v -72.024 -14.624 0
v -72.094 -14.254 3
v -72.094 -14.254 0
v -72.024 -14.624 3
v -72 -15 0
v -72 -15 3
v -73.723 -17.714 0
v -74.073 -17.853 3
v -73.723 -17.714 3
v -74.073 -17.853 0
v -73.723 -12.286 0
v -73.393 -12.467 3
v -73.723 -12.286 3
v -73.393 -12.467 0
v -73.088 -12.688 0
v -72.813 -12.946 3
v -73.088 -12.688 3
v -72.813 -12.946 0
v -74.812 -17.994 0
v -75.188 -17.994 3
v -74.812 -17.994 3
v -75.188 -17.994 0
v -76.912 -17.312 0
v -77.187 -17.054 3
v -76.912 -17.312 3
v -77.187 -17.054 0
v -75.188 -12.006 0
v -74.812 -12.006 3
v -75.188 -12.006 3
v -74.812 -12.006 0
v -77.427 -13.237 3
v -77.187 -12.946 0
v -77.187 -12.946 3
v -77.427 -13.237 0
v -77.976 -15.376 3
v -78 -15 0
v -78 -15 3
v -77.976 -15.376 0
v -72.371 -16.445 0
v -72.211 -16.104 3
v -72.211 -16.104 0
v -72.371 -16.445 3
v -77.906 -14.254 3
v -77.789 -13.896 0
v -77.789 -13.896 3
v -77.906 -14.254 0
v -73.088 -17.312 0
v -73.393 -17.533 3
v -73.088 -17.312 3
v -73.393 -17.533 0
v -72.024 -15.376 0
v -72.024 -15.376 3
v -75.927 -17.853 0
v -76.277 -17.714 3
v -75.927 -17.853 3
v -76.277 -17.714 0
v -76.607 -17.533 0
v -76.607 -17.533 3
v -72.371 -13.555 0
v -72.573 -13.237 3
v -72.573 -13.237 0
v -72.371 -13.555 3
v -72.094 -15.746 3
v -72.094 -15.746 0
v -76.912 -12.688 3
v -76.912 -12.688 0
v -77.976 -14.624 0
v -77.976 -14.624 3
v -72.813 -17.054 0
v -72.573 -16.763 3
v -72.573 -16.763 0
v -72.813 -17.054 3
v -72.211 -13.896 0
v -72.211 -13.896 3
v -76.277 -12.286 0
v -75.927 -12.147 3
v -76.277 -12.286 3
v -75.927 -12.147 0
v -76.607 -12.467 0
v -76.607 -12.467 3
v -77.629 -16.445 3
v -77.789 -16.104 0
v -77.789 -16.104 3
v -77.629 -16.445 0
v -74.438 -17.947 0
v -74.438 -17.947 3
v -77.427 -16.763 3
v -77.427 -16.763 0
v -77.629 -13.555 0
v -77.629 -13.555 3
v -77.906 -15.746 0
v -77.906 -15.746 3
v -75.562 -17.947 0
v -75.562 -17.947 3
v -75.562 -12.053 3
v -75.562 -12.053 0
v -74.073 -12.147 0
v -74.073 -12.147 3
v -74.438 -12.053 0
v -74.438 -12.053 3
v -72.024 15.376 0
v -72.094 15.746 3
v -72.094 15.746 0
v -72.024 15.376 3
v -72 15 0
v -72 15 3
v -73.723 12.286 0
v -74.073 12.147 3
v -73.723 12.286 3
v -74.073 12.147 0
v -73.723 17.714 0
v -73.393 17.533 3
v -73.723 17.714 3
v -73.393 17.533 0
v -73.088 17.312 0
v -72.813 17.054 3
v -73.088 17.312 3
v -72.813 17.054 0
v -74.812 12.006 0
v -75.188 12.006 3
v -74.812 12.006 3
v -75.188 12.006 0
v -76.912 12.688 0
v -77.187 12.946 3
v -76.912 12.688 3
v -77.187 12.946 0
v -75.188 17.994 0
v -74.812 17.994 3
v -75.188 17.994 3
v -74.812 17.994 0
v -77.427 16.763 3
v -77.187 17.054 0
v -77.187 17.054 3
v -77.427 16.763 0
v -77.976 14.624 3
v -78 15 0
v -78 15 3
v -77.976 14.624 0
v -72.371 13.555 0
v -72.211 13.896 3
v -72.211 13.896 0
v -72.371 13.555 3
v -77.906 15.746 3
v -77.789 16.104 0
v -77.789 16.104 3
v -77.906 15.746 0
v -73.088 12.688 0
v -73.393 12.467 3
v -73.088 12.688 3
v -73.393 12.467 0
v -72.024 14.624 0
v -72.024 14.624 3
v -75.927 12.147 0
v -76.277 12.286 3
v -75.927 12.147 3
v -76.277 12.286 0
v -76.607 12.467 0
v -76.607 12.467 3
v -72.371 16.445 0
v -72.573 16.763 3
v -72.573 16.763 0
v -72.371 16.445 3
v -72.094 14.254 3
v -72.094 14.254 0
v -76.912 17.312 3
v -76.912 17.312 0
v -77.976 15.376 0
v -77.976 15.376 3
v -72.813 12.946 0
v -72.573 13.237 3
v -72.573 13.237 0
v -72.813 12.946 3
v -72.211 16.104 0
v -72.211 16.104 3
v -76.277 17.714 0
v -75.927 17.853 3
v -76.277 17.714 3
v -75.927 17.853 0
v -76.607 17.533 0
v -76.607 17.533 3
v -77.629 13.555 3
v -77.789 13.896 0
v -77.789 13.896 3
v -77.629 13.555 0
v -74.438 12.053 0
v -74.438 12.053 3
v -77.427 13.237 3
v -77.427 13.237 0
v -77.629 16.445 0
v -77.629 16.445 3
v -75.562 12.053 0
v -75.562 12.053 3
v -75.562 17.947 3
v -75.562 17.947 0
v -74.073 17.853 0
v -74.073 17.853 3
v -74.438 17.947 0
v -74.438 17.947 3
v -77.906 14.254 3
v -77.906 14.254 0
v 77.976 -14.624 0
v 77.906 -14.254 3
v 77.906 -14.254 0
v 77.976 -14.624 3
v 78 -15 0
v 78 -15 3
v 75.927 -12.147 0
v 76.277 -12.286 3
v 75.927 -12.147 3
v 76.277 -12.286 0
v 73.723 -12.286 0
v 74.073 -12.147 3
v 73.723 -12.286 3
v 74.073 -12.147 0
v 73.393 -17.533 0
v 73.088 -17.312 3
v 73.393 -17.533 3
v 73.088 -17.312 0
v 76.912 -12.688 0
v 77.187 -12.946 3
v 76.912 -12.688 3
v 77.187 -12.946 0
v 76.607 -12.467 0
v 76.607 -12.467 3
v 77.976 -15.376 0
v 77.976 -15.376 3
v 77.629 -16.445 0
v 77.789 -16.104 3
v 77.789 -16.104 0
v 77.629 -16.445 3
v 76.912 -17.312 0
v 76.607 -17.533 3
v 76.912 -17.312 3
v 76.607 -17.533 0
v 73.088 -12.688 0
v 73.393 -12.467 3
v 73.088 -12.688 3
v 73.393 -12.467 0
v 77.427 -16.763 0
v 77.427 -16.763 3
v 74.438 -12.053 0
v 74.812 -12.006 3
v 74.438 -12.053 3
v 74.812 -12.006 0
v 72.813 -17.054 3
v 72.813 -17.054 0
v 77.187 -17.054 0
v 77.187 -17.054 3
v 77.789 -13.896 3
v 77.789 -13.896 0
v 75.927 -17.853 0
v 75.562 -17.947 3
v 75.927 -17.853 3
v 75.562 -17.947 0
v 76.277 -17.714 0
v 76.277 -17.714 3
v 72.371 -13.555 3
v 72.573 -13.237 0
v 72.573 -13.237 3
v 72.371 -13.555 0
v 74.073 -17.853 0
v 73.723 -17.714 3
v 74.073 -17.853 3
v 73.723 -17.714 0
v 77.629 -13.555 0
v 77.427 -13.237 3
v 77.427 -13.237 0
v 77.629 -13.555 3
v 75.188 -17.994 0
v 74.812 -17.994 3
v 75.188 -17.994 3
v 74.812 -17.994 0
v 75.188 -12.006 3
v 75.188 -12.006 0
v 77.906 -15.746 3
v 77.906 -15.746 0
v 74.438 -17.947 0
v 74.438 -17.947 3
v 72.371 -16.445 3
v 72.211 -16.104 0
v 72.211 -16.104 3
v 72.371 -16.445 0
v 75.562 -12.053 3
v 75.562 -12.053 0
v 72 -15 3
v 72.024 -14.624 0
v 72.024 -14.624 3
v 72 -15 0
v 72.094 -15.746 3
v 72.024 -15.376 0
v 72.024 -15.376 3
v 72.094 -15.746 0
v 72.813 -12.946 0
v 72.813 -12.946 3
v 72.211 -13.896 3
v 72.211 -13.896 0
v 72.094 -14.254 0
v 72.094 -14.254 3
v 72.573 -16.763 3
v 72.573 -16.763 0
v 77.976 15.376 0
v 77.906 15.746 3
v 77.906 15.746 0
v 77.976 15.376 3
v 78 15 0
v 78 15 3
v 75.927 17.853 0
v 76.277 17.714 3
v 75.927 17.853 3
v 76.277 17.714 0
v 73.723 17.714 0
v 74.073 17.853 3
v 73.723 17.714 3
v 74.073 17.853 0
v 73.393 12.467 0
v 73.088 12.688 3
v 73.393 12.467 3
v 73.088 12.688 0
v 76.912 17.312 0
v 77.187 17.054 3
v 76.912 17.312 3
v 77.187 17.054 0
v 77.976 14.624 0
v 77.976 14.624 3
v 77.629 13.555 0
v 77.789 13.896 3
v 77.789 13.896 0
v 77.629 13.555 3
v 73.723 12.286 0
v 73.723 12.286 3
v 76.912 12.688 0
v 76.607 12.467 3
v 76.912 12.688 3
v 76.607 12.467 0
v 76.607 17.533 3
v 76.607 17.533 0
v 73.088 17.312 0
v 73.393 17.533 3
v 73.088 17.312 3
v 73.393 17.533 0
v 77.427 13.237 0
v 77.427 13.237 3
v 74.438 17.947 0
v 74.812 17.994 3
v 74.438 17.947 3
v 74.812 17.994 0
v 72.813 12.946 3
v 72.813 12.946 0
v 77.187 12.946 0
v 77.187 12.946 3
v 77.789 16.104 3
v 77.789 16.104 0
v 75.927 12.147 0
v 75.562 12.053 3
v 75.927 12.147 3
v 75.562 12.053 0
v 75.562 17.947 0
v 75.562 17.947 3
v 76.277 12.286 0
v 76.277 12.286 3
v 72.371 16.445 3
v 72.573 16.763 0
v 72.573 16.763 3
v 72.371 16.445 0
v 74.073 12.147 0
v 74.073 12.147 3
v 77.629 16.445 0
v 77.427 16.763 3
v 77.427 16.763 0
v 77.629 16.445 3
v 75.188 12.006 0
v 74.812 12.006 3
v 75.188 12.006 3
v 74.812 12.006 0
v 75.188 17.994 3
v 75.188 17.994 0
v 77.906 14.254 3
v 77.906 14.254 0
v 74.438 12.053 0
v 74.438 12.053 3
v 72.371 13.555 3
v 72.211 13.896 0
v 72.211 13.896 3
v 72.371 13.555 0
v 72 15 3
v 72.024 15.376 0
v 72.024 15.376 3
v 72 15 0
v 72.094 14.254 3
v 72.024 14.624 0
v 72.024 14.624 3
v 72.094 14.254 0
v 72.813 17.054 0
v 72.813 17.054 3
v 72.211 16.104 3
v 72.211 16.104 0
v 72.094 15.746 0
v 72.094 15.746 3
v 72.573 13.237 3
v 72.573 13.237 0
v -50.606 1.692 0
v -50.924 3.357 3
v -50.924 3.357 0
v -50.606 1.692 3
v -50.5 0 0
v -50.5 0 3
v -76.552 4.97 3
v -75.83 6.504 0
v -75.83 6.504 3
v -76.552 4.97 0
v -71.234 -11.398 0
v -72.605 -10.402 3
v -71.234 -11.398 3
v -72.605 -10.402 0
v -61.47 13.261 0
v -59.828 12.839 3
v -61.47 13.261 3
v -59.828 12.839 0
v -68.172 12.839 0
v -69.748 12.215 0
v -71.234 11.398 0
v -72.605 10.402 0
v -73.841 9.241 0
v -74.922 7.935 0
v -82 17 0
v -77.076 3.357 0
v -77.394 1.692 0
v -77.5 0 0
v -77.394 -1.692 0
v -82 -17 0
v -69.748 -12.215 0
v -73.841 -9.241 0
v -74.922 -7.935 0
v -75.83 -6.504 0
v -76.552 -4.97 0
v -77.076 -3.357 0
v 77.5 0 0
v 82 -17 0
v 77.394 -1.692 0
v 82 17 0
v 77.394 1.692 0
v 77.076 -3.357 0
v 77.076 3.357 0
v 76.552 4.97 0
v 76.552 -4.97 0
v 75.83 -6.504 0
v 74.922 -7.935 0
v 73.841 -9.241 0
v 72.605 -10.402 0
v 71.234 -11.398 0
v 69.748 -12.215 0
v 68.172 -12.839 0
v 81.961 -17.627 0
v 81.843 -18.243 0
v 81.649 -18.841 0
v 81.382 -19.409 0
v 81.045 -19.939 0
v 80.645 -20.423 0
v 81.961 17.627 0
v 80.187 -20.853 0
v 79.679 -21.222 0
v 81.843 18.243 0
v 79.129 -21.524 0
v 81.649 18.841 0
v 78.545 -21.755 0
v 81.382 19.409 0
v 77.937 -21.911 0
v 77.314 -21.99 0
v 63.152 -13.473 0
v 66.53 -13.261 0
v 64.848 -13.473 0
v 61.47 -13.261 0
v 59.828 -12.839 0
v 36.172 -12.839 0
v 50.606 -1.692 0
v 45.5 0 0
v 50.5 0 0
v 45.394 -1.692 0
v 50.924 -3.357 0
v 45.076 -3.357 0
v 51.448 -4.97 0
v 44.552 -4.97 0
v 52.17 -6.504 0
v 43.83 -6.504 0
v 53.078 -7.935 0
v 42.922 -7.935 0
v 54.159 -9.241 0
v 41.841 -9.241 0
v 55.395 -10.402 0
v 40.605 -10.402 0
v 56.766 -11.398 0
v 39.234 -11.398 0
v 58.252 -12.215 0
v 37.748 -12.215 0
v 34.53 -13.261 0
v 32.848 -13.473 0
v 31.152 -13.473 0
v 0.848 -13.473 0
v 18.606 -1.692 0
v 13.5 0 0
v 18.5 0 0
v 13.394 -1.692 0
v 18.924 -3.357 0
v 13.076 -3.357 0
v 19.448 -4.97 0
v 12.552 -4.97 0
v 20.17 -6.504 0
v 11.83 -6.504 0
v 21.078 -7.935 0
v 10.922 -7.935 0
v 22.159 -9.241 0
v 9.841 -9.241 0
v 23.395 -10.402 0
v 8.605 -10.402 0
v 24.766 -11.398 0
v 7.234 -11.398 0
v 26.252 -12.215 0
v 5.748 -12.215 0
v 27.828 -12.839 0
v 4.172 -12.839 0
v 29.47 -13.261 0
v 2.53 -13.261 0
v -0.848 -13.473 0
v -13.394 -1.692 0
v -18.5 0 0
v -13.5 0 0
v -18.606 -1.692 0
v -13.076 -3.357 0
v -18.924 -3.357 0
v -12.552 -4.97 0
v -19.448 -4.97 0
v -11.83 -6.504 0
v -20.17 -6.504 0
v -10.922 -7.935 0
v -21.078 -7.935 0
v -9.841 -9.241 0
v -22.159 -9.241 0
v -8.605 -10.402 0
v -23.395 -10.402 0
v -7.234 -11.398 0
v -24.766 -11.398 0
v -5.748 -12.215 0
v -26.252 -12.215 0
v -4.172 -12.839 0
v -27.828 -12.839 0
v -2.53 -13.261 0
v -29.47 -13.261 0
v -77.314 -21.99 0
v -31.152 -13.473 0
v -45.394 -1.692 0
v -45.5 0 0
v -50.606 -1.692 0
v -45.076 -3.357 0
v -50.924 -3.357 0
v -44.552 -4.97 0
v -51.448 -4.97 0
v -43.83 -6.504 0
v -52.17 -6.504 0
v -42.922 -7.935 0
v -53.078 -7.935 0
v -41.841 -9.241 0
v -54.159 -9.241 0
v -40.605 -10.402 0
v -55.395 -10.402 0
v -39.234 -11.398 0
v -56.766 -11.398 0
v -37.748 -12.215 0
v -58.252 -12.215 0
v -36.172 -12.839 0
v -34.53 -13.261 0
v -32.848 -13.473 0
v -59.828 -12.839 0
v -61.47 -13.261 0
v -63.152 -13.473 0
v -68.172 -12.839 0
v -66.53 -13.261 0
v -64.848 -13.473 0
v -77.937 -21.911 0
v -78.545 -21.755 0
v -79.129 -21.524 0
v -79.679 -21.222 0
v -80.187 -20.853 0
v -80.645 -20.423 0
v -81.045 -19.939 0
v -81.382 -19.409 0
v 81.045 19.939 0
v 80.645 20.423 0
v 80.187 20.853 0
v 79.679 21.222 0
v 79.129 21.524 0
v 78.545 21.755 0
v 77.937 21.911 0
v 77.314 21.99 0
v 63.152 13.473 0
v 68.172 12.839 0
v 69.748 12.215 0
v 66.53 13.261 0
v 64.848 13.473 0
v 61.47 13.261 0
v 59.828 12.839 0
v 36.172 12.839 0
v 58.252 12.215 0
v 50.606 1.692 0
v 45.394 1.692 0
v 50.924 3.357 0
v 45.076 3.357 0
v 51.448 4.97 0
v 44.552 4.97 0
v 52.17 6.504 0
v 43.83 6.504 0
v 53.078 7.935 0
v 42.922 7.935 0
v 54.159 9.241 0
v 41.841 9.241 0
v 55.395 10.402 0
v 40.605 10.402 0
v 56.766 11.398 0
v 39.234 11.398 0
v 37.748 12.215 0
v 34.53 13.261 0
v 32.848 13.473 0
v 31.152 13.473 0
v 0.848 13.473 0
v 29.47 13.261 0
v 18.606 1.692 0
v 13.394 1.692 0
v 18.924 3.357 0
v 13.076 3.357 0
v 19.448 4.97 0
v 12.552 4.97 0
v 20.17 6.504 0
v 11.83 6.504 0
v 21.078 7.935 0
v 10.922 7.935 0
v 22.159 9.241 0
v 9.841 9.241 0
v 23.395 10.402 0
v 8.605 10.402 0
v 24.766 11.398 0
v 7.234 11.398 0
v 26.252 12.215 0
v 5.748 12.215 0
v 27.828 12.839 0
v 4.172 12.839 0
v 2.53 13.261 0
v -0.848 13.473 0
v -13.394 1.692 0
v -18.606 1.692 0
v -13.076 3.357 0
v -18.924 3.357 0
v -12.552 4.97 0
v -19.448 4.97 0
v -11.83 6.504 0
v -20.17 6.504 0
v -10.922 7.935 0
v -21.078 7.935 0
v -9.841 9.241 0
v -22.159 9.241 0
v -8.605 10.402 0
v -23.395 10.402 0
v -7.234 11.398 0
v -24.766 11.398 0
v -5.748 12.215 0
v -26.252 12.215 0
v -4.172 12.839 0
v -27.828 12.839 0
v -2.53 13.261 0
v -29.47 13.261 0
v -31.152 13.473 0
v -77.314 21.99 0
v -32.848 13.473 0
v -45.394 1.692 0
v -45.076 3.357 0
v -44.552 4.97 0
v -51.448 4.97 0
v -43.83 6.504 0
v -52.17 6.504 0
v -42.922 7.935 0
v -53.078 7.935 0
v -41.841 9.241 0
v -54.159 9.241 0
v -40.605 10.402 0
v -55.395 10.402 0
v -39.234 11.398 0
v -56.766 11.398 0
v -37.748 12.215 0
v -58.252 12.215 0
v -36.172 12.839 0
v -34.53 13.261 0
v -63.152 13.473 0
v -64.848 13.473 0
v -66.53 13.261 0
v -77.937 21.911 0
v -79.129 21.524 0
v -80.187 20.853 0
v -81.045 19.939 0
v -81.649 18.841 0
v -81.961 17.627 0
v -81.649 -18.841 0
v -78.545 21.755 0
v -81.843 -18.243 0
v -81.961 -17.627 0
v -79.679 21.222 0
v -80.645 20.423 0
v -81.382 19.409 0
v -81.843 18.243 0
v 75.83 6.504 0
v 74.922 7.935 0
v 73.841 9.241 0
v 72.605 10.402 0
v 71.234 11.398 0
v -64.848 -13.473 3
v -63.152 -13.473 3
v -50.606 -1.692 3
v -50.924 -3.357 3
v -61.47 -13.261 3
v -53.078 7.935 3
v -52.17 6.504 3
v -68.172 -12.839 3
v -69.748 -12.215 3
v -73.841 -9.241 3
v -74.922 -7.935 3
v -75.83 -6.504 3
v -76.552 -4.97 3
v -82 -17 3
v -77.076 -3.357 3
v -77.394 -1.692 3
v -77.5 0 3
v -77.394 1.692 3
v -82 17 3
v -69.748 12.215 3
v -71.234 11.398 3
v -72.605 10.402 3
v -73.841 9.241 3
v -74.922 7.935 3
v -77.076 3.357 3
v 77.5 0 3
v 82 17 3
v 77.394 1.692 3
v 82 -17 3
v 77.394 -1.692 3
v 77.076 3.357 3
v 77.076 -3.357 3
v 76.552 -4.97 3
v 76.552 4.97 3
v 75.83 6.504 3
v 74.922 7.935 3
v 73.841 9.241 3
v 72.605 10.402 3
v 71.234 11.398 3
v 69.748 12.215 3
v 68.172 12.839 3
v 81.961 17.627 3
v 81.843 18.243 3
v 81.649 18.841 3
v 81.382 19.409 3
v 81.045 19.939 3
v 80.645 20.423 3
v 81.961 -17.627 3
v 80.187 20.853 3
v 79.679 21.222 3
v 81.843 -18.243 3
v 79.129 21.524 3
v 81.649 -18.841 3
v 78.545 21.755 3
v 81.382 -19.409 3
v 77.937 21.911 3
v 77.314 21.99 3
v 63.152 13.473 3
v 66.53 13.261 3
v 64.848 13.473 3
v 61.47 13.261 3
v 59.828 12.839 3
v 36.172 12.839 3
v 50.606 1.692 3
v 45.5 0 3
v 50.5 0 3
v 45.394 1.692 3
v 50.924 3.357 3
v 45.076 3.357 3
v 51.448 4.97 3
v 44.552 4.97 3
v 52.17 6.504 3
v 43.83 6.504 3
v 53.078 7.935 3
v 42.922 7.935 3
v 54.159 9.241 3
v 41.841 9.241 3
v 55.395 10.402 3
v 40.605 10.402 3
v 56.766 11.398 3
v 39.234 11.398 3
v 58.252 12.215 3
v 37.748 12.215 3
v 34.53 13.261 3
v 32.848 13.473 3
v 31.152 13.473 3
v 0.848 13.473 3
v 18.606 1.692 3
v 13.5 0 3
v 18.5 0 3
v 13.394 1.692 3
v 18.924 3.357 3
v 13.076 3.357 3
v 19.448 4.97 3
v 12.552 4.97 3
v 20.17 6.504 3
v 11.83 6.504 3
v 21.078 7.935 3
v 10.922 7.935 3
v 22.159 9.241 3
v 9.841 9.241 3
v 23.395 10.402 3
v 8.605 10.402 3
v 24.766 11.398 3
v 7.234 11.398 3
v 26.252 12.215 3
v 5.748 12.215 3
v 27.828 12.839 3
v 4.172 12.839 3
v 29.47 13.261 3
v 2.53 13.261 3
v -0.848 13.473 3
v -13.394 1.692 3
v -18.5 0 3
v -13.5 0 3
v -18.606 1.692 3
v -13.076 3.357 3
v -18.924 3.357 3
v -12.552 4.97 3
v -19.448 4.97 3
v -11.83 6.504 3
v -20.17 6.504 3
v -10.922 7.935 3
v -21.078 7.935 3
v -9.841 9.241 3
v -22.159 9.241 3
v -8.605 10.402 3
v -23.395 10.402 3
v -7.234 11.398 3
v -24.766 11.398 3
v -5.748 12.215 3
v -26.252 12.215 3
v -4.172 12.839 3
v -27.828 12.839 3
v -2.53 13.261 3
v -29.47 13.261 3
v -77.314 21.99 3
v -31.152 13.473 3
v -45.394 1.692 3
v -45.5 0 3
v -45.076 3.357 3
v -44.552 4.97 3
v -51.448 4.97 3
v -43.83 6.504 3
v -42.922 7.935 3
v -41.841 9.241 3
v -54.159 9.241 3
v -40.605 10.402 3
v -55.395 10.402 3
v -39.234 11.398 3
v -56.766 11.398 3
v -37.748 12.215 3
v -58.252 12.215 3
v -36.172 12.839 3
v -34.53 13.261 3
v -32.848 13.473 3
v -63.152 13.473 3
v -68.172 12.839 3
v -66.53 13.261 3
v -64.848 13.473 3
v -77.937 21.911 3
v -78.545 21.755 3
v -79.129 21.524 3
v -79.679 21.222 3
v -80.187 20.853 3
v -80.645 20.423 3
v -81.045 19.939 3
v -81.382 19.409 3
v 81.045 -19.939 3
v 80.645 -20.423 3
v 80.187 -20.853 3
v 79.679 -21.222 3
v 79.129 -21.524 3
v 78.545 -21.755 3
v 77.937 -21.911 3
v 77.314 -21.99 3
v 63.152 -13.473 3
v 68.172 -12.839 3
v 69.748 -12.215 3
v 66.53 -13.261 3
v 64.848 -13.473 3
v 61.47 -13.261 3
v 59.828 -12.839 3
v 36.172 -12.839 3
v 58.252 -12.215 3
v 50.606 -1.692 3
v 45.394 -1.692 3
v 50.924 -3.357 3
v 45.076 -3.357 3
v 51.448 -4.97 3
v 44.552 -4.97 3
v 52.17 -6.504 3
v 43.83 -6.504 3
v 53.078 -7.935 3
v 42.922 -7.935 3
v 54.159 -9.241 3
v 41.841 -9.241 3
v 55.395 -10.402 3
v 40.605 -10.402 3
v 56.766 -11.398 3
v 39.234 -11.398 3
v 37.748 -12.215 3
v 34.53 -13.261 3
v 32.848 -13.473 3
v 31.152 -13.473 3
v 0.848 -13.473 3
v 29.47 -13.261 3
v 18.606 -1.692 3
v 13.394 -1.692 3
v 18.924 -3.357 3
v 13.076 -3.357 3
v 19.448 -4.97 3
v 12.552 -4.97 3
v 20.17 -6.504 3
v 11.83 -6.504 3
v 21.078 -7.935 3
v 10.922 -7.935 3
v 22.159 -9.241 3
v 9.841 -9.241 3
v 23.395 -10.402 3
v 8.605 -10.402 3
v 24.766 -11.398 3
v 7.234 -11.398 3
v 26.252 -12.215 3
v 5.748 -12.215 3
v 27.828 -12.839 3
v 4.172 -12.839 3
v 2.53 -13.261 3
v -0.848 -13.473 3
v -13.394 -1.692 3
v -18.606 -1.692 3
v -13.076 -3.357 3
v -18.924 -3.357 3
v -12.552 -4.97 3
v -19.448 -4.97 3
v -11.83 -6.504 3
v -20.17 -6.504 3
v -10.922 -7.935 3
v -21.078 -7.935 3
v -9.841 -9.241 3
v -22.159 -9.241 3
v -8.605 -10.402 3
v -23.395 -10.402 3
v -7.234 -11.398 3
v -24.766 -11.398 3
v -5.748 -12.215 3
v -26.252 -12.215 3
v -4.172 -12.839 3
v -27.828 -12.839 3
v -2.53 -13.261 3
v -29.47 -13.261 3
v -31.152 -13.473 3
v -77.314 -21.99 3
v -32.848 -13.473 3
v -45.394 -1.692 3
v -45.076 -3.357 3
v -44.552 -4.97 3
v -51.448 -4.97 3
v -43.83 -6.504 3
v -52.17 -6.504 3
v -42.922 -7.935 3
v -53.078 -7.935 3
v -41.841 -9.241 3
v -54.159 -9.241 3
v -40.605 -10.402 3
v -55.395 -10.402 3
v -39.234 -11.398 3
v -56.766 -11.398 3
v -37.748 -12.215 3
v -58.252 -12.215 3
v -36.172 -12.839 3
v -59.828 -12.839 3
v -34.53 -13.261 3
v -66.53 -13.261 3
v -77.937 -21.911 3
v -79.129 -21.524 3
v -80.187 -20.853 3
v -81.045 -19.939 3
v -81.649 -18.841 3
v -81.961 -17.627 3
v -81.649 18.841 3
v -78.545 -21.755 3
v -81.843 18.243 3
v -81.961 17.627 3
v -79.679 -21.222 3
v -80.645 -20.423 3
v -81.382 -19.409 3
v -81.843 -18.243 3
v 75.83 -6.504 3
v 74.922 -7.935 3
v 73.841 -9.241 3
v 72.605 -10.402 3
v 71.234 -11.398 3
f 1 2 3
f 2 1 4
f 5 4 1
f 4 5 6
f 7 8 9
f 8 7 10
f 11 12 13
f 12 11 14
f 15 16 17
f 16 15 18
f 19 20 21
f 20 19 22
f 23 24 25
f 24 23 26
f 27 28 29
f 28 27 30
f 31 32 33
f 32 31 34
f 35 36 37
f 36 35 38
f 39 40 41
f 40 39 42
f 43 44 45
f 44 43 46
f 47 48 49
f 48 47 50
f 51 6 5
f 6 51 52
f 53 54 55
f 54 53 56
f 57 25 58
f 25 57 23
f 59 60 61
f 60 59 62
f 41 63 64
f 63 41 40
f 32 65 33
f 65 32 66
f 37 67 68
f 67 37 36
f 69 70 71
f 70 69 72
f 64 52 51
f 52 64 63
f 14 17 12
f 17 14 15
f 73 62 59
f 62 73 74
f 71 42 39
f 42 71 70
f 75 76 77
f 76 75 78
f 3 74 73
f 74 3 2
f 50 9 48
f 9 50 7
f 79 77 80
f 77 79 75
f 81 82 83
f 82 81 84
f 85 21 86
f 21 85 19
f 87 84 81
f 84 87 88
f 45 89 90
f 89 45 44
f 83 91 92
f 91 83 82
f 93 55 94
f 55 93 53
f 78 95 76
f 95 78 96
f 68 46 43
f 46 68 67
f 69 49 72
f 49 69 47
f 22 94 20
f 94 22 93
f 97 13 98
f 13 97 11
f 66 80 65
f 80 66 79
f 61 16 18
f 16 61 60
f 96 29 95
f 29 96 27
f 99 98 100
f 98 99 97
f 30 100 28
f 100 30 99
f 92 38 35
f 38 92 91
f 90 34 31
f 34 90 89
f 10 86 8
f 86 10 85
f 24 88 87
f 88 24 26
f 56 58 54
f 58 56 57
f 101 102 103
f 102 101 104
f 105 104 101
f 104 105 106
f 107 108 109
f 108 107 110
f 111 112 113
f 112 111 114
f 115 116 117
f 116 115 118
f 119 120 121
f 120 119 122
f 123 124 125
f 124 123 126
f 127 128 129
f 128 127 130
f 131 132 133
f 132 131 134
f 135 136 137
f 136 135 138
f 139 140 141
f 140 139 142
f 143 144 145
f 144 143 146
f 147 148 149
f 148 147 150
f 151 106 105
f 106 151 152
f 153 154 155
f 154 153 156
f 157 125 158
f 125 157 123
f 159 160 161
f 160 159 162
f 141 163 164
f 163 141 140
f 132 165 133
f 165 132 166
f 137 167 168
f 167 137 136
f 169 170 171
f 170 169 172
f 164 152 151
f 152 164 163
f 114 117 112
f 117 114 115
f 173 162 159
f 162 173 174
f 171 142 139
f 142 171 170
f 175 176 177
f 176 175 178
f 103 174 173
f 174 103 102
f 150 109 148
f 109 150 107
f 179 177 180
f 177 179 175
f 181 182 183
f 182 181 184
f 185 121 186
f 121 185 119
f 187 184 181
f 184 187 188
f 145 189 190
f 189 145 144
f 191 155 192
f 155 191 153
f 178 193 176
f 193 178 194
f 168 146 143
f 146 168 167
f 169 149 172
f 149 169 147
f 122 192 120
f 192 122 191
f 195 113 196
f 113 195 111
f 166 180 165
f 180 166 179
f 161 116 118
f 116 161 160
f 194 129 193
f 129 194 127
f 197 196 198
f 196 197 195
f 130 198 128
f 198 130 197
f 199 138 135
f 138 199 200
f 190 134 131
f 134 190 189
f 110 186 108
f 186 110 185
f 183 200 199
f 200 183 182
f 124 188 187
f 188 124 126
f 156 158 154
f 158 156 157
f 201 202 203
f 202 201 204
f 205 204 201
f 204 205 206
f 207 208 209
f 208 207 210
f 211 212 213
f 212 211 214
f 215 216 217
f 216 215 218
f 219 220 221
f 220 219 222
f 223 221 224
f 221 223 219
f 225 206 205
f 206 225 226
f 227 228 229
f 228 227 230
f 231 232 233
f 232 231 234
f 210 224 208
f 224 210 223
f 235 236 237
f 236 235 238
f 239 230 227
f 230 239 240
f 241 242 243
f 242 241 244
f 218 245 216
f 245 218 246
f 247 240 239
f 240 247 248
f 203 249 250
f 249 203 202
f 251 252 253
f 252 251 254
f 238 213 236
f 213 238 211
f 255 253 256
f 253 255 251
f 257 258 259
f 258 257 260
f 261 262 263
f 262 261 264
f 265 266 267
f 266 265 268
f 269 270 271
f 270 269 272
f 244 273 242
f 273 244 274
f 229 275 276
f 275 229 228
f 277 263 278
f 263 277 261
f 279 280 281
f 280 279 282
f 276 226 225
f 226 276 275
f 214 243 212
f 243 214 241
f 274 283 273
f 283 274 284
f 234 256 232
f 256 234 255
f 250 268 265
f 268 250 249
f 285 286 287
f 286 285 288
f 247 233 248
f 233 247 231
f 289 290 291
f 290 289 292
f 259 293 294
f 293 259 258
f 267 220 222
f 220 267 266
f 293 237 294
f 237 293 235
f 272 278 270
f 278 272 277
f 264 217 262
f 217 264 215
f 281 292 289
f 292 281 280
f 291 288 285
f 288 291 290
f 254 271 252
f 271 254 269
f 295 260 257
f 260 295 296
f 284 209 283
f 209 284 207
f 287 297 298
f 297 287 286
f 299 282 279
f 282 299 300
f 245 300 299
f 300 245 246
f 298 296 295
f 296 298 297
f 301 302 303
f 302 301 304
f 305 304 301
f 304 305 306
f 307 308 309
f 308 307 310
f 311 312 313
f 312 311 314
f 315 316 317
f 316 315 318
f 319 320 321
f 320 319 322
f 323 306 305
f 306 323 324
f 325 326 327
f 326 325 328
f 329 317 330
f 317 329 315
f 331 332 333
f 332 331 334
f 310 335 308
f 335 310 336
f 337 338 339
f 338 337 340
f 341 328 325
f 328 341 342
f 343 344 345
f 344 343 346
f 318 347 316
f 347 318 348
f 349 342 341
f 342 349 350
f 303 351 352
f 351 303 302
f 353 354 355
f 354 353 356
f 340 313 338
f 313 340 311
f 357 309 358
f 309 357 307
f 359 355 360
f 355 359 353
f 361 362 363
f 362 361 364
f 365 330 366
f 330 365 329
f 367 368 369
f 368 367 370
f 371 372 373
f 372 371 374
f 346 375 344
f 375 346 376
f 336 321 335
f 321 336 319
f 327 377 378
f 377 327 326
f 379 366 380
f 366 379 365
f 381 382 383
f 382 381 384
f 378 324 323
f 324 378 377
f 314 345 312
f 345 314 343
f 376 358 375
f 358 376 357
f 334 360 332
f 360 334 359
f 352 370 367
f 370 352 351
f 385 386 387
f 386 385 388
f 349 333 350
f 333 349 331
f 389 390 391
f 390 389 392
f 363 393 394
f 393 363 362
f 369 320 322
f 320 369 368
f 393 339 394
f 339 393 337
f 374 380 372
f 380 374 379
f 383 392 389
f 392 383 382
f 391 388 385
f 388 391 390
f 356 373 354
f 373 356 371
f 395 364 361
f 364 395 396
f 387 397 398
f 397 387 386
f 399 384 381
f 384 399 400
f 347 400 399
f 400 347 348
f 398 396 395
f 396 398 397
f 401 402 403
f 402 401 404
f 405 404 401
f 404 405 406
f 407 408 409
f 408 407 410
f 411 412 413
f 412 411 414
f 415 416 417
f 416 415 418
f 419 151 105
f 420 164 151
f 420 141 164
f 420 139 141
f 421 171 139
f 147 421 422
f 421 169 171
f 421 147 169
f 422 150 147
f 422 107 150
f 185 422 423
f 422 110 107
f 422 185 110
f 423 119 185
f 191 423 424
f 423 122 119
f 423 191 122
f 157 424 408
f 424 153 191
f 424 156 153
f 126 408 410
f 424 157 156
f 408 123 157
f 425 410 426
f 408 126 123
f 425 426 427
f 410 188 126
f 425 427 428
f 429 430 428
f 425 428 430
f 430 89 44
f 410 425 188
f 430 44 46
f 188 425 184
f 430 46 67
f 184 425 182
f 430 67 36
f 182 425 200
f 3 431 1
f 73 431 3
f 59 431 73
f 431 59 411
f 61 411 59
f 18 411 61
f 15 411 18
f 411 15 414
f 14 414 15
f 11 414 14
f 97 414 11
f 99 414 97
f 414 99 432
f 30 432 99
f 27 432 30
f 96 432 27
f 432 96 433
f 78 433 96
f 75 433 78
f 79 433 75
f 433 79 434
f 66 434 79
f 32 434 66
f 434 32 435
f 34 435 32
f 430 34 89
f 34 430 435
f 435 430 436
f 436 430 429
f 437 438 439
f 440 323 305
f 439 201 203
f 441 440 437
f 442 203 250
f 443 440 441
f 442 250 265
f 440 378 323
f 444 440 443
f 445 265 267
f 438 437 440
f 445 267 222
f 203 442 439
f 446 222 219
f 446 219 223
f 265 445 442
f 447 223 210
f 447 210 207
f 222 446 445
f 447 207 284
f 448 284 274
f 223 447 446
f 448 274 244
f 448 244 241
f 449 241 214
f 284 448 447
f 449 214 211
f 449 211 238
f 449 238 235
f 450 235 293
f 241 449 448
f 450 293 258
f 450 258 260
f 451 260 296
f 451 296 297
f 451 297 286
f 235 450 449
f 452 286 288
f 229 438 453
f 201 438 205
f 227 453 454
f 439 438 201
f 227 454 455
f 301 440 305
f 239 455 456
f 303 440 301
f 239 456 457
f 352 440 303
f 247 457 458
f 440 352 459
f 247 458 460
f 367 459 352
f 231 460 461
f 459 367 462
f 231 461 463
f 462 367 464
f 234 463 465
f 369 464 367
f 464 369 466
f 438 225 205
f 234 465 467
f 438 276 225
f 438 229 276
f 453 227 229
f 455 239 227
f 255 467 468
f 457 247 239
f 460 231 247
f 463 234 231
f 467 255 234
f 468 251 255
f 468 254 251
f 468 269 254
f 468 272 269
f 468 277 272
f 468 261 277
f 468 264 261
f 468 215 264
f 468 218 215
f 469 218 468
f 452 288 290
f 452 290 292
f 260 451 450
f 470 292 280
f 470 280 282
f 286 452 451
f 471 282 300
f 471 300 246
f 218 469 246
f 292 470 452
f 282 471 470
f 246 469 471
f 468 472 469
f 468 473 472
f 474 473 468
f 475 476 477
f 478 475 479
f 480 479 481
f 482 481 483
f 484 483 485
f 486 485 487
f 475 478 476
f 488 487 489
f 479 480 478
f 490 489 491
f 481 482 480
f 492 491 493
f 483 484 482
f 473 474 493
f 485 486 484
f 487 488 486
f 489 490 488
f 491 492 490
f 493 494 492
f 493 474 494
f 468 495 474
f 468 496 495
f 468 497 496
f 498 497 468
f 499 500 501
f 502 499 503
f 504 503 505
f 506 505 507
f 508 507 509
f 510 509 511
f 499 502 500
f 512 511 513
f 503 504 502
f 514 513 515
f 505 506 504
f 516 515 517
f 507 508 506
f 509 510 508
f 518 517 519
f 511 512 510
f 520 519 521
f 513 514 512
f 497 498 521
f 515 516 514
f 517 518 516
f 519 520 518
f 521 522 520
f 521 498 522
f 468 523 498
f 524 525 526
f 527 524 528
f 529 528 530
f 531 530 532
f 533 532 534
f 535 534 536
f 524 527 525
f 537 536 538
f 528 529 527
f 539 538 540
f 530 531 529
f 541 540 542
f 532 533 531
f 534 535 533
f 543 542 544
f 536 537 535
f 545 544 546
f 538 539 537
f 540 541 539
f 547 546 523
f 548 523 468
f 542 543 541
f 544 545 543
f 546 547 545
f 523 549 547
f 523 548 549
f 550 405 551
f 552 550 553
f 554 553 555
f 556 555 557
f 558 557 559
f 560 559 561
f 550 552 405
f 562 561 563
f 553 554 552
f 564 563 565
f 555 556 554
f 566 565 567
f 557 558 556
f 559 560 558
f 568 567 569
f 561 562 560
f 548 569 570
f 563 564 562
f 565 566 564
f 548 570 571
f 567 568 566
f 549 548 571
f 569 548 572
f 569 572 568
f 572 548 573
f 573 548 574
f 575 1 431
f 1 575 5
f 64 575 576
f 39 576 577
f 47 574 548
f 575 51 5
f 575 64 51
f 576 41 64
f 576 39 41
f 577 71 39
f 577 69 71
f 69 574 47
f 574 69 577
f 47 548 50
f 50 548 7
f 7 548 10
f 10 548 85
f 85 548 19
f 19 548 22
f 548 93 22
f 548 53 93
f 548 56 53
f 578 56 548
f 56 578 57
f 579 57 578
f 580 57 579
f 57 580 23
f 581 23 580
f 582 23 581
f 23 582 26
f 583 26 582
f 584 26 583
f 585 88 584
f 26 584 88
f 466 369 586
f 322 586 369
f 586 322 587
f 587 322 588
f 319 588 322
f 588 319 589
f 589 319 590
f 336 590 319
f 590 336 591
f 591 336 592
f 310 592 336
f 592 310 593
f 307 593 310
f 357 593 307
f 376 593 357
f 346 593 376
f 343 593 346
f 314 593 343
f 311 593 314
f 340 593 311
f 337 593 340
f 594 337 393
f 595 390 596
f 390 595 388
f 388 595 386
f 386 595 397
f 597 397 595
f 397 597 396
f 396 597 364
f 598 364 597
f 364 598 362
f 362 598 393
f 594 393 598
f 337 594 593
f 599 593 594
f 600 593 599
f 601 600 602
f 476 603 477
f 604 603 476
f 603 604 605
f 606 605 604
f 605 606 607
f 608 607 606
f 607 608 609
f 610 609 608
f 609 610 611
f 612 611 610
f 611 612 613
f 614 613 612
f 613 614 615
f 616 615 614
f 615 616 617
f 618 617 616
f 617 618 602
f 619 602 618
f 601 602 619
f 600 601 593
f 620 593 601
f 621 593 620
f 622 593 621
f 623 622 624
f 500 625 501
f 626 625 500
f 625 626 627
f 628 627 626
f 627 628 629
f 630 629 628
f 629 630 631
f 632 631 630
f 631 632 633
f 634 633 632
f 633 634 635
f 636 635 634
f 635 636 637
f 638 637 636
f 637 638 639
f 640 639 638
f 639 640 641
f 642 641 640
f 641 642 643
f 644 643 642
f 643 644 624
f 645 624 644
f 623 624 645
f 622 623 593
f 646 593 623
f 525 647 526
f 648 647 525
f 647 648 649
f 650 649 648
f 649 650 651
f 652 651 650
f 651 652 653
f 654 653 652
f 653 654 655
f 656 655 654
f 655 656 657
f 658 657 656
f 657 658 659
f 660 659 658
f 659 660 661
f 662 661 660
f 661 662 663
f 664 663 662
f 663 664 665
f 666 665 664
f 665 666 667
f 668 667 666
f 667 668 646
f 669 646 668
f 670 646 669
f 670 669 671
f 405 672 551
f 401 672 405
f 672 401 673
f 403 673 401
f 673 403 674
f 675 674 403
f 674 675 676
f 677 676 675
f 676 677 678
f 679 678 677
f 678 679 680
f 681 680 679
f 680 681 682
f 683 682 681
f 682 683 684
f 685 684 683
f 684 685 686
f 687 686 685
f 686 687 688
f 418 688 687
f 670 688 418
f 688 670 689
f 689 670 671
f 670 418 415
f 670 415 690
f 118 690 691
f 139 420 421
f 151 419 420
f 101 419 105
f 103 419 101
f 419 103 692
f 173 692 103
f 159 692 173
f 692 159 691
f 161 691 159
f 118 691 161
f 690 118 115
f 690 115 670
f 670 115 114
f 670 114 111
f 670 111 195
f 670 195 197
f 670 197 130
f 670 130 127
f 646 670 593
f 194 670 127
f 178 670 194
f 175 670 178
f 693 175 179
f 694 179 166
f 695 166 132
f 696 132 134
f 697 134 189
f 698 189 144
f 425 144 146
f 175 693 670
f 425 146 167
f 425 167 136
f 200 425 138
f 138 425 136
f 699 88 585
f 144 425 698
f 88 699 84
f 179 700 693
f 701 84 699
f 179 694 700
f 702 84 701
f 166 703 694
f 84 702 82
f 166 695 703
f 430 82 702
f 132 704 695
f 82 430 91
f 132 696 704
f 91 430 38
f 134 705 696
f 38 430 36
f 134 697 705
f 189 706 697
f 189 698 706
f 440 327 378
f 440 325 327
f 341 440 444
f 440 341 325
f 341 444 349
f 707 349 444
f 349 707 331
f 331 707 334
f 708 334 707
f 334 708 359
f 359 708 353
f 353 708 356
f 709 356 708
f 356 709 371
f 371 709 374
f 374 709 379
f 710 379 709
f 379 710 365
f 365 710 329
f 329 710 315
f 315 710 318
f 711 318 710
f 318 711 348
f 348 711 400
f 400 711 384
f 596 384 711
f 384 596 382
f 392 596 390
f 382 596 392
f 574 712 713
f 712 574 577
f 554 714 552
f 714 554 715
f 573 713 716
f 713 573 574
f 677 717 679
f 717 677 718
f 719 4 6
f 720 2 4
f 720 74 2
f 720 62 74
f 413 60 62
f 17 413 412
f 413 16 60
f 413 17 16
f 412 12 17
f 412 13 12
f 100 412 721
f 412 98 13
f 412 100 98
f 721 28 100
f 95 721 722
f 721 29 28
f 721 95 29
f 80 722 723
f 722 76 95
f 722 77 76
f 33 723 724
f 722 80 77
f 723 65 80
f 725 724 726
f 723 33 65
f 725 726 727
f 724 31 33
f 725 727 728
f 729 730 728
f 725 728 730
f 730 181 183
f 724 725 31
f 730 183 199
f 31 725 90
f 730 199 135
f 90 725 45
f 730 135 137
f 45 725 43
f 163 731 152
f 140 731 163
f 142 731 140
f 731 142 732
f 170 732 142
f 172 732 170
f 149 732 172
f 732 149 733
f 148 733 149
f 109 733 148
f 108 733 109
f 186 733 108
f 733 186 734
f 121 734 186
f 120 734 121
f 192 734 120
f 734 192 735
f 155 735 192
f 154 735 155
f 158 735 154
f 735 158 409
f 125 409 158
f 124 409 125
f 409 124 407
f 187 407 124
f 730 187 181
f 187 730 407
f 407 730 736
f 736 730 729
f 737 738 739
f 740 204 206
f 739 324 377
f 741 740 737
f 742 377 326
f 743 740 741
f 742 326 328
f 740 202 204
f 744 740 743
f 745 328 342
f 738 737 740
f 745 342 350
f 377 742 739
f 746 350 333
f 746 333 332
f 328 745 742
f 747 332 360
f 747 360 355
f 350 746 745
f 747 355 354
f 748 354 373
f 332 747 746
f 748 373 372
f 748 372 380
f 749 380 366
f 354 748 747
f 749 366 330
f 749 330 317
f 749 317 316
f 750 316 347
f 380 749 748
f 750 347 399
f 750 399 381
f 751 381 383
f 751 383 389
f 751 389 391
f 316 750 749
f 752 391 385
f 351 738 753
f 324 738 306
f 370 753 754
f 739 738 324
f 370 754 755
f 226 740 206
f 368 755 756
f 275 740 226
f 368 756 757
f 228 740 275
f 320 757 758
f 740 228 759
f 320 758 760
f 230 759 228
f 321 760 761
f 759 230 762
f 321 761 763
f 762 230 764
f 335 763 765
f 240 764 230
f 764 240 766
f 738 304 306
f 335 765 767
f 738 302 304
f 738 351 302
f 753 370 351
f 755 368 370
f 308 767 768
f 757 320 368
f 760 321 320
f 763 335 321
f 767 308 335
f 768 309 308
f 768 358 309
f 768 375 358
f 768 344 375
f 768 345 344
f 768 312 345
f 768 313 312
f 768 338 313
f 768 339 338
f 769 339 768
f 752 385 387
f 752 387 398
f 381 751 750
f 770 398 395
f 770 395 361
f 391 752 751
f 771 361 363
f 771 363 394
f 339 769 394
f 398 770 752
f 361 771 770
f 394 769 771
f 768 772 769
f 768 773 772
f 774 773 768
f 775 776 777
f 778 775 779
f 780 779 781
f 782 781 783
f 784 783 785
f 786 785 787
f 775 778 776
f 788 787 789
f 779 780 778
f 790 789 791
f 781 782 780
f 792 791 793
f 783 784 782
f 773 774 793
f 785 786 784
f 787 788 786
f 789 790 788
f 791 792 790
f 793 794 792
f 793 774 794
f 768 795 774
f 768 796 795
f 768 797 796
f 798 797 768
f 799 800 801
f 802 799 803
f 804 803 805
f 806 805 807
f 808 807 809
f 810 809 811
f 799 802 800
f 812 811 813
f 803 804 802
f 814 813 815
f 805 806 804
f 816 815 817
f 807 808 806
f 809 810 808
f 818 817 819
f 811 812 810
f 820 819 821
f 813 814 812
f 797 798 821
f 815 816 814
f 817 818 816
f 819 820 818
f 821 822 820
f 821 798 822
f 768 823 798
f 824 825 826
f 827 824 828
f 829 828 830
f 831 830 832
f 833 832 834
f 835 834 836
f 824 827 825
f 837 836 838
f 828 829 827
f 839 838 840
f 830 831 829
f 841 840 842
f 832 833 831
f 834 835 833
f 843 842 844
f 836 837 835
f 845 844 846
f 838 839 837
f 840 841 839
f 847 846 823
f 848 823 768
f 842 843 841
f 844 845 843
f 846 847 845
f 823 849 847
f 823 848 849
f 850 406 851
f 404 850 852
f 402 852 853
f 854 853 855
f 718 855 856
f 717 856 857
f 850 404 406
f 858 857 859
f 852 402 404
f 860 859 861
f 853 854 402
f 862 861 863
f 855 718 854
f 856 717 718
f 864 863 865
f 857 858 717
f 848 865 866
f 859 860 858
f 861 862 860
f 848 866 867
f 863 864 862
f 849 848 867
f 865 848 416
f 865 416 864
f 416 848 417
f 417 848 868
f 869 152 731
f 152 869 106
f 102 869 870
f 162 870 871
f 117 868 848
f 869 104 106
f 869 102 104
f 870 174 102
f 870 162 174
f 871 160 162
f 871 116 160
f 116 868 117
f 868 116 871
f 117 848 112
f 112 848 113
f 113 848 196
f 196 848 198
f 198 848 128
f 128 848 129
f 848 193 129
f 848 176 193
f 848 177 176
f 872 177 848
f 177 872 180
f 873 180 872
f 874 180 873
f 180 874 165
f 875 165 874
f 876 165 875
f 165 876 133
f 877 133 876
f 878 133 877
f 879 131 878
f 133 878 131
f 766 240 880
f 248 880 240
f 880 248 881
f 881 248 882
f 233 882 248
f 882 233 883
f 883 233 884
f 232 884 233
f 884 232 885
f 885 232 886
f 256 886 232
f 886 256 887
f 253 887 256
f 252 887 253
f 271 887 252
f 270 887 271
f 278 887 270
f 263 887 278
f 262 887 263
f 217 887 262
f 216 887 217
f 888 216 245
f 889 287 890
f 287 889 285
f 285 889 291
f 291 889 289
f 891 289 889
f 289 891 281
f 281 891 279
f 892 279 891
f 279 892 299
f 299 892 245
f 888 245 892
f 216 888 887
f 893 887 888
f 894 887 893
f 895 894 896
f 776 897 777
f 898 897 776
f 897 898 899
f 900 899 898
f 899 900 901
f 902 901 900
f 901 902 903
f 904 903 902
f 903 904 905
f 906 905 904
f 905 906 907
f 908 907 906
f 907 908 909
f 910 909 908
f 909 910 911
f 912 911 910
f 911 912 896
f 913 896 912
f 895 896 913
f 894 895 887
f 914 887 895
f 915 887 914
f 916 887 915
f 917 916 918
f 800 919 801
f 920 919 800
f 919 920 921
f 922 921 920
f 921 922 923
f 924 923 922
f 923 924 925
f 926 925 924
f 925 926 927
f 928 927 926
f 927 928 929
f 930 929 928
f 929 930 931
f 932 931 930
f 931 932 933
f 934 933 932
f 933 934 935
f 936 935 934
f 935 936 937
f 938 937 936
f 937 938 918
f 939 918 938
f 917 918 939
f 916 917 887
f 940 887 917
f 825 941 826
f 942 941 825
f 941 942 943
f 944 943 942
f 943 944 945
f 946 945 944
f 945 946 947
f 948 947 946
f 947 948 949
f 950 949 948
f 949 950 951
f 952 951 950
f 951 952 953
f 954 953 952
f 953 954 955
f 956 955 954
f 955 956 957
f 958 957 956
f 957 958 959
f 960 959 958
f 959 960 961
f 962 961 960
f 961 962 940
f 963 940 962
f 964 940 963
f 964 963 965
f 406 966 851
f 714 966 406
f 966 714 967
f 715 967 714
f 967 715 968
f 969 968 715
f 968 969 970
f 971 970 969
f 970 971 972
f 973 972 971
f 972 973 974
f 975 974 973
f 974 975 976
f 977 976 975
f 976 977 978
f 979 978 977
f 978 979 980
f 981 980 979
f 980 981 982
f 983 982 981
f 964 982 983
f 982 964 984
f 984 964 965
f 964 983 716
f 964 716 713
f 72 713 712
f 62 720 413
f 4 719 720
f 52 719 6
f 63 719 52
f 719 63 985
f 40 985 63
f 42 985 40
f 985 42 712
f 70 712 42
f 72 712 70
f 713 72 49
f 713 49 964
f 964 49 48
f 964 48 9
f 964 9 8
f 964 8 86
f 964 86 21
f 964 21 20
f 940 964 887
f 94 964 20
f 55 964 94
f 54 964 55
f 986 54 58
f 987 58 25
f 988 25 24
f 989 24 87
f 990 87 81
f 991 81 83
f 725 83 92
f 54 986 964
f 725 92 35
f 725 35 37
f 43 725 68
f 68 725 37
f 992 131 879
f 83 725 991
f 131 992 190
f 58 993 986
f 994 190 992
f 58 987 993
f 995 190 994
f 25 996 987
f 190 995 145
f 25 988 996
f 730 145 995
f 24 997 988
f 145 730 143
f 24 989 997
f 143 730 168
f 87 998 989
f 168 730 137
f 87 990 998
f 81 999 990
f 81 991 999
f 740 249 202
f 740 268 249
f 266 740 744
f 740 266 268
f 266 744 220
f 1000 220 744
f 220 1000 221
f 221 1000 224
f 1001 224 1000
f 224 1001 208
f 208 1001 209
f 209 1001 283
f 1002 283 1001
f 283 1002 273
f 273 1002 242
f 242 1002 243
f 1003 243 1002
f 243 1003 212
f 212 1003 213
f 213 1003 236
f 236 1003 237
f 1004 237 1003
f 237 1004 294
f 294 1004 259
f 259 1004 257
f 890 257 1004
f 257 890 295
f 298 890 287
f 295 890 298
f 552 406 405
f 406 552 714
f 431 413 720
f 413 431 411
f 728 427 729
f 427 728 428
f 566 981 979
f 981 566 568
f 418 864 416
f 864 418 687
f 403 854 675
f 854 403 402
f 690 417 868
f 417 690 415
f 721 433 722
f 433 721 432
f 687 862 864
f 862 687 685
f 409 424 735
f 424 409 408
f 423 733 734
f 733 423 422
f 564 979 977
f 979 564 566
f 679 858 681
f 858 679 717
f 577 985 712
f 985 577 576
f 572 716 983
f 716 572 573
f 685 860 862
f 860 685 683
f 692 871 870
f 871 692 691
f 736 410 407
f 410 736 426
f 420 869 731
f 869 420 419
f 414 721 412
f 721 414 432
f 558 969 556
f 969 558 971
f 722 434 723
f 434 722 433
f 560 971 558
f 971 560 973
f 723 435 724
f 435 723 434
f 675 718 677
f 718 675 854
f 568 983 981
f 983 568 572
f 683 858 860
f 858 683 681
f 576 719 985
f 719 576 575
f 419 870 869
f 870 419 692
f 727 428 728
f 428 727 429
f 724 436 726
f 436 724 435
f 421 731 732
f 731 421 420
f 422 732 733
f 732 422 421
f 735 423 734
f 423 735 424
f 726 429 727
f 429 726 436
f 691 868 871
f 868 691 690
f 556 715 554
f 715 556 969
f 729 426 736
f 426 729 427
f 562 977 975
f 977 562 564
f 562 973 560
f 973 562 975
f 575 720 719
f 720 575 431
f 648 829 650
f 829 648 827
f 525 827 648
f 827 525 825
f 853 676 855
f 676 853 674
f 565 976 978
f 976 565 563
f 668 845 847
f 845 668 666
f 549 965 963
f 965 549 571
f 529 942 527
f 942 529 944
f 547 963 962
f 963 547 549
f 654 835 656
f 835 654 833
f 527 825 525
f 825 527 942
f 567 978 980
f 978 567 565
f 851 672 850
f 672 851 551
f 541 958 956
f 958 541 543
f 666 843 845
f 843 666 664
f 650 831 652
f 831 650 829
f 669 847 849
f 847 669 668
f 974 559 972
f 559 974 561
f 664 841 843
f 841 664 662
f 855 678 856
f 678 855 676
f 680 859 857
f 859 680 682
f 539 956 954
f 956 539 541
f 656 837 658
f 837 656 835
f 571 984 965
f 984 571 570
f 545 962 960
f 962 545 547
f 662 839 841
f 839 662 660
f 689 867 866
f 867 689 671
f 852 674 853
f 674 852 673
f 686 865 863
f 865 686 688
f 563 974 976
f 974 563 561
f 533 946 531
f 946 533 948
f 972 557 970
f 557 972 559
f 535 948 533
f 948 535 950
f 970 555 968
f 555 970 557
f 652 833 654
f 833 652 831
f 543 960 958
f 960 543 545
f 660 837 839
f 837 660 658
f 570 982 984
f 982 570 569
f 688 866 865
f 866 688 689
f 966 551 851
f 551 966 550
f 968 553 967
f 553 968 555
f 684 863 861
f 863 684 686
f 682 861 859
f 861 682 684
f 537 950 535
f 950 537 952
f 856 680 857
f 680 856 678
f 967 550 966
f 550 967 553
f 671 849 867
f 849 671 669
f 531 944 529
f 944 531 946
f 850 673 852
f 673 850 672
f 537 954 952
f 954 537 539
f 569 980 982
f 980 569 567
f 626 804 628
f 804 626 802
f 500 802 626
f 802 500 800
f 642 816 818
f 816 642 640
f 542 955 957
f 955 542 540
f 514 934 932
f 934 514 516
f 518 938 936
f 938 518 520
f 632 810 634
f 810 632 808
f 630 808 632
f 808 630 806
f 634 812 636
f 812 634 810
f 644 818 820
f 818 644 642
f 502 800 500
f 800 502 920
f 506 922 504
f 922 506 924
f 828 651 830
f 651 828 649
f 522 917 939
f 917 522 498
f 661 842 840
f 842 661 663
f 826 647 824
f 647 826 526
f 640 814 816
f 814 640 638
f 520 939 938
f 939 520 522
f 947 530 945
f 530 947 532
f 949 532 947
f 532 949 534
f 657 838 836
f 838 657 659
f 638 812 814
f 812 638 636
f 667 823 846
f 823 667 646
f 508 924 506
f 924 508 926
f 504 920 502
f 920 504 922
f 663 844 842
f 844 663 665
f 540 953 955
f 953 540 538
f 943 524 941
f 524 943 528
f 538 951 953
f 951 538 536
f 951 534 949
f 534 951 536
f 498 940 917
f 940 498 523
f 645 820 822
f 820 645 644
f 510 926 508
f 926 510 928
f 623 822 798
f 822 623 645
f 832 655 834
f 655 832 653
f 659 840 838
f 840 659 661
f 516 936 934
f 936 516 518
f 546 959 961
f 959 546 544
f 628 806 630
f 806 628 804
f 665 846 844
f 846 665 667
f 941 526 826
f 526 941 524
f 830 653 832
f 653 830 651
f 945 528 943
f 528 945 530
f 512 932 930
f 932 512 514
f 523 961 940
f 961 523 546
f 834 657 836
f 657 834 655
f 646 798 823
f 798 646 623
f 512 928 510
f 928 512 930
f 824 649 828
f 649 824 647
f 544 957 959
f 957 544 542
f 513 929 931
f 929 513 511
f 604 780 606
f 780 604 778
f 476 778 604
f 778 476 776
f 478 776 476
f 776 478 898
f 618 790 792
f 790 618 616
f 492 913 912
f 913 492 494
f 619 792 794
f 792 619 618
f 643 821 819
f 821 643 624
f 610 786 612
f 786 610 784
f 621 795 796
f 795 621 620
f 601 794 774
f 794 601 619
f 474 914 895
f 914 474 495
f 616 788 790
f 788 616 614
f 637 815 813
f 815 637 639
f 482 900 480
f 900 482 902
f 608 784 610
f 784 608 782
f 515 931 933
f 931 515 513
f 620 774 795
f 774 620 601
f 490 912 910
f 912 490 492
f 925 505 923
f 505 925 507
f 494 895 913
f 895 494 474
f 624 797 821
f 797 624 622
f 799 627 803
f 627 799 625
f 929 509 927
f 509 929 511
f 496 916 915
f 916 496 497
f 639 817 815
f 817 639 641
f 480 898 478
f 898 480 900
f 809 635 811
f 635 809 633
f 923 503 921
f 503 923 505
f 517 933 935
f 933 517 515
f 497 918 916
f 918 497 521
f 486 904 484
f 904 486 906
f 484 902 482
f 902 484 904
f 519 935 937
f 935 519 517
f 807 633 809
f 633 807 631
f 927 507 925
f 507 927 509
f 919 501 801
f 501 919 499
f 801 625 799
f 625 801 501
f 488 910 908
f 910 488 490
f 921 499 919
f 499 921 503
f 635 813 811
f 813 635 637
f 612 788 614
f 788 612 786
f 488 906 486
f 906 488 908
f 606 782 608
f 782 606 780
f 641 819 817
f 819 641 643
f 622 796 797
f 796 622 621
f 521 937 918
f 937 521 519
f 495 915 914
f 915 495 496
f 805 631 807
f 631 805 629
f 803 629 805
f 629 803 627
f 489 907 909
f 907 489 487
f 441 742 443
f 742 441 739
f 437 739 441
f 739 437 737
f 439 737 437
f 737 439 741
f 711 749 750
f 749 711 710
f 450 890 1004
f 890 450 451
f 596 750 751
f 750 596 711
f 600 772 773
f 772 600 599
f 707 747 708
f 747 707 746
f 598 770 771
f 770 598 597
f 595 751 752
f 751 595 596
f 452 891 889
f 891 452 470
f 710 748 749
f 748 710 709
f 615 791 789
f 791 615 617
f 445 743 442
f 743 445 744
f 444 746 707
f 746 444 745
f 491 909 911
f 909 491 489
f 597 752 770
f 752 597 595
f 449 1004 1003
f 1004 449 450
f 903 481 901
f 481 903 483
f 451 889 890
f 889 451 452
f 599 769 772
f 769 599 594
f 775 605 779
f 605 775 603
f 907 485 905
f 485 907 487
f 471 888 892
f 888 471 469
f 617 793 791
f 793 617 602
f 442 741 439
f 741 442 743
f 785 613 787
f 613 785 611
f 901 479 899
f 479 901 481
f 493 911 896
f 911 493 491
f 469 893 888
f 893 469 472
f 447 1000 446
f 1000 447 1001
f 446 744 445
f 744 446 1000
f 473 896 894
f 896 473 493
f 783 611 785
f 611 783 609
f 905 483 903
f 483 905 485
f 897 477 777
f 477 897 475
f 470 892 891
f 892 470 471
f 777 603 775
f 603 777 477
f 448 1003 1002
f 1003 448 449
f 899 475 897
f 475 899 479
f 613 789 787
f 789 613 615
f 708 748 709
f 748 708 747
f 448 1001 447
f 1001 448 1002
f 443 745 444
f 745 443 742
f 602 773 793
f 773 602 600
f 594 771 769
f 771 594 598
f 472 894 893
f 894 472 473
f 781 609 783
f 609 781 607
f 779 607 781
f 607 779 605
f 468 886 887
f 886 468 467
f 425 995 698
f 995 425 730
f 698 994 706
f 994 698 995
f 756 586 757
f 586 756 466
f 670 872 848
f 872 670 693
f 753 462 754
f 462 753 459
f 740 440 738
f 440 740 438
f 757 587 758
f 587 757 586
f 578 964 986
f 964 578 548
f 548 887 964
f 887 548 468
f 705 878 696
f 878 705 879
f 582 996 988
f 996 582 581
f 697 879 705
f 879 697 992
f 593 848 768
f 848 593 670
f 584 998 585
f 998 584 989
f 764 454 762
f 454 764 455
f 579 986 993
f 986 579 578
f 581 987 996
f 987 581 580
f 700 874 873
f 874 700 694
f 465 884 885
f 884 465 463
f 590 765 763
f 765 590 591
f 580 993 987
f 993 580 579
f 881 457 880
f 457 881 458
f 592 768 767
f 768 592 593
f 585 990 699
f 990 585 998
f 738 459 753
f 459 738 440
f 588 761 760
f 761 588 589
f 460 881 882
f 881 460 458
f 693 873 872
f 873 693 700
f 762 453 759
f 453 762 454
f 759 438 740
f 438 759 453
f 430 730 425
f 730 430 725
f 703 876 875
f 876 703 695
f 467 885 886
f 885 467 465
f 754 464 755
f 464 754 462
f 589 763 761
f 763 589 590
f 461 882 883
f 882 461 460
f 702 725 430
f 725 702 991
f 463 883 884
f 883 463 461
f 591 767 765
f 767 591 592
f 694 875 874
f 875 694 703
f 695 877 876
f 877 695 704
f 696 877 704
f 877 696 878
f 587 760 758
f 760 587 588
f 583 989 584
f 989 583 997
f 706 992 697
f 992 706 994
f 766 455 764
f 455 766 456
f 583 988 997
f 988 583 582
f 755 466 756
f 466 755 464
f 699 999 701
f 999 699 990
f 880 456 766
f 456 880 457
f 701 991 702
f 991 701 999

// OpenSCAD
$fn = 50;


difference() {
	union() {
		hull() {
			translate(v = [-77.0000000000, 17.0000000000, 0]) {
				cylinder(h = 3, r = 5);
			}
			translate(v = [77.0000000000, 17.0000000000, 0]) {
				cylinder(h = 3, r = 5);
			}
			translate(v = [-77.0000000000, -17.0000000000, 0]) {
				cylinder(h = 3, r = 5);
			}
			translate(v = [77.0000000000, -17.0000000000, 0]) {
				cylinder(h = 3, r = 5);
			}
		}
	}
	union() {
		#translate(v = [-75.0000000000, -15.0000000000, -100.0000000000]) {
			cylinder(h = 200, r = 3.0000000000);
		}
		#translate(v = [-75.0000000000, 15.0000000000, -100.0000000000]) {
			cylinder(h = 200, r = 3.0000000000);
		}
		#translate(v = [75.0000000000, -15.0000000000, -100.0000000000]) {
			cylinder(h = 200, r = 3.0000000000);
		}
		#translate(v = [75.0000000000, 15.0000000000, -100.0000000000]) {
			cylinder(h = 200, r = 3.0000000000);
		}
		#translate(v = [-64.0000000000, 0, 0]) {
			cylinder(h = 3, r = 13.5000000000);
		}
		#translate(v = [-32.0000000000, 0, 0]) {
			cylinder(h = 3, r = 13.5000000000);
		}
		#cylinder(h = 3, r = 13.5000000000);
		#translate(v = [32.0000000000, 0, 0]) {
			cylinder(h = 3, r = 13.5000000000);
		}
		#translate(v = [64.0000000000, 0, 0]) {
			cylinder(h = 3, r = 13.5000000000);
		}
	}
}
